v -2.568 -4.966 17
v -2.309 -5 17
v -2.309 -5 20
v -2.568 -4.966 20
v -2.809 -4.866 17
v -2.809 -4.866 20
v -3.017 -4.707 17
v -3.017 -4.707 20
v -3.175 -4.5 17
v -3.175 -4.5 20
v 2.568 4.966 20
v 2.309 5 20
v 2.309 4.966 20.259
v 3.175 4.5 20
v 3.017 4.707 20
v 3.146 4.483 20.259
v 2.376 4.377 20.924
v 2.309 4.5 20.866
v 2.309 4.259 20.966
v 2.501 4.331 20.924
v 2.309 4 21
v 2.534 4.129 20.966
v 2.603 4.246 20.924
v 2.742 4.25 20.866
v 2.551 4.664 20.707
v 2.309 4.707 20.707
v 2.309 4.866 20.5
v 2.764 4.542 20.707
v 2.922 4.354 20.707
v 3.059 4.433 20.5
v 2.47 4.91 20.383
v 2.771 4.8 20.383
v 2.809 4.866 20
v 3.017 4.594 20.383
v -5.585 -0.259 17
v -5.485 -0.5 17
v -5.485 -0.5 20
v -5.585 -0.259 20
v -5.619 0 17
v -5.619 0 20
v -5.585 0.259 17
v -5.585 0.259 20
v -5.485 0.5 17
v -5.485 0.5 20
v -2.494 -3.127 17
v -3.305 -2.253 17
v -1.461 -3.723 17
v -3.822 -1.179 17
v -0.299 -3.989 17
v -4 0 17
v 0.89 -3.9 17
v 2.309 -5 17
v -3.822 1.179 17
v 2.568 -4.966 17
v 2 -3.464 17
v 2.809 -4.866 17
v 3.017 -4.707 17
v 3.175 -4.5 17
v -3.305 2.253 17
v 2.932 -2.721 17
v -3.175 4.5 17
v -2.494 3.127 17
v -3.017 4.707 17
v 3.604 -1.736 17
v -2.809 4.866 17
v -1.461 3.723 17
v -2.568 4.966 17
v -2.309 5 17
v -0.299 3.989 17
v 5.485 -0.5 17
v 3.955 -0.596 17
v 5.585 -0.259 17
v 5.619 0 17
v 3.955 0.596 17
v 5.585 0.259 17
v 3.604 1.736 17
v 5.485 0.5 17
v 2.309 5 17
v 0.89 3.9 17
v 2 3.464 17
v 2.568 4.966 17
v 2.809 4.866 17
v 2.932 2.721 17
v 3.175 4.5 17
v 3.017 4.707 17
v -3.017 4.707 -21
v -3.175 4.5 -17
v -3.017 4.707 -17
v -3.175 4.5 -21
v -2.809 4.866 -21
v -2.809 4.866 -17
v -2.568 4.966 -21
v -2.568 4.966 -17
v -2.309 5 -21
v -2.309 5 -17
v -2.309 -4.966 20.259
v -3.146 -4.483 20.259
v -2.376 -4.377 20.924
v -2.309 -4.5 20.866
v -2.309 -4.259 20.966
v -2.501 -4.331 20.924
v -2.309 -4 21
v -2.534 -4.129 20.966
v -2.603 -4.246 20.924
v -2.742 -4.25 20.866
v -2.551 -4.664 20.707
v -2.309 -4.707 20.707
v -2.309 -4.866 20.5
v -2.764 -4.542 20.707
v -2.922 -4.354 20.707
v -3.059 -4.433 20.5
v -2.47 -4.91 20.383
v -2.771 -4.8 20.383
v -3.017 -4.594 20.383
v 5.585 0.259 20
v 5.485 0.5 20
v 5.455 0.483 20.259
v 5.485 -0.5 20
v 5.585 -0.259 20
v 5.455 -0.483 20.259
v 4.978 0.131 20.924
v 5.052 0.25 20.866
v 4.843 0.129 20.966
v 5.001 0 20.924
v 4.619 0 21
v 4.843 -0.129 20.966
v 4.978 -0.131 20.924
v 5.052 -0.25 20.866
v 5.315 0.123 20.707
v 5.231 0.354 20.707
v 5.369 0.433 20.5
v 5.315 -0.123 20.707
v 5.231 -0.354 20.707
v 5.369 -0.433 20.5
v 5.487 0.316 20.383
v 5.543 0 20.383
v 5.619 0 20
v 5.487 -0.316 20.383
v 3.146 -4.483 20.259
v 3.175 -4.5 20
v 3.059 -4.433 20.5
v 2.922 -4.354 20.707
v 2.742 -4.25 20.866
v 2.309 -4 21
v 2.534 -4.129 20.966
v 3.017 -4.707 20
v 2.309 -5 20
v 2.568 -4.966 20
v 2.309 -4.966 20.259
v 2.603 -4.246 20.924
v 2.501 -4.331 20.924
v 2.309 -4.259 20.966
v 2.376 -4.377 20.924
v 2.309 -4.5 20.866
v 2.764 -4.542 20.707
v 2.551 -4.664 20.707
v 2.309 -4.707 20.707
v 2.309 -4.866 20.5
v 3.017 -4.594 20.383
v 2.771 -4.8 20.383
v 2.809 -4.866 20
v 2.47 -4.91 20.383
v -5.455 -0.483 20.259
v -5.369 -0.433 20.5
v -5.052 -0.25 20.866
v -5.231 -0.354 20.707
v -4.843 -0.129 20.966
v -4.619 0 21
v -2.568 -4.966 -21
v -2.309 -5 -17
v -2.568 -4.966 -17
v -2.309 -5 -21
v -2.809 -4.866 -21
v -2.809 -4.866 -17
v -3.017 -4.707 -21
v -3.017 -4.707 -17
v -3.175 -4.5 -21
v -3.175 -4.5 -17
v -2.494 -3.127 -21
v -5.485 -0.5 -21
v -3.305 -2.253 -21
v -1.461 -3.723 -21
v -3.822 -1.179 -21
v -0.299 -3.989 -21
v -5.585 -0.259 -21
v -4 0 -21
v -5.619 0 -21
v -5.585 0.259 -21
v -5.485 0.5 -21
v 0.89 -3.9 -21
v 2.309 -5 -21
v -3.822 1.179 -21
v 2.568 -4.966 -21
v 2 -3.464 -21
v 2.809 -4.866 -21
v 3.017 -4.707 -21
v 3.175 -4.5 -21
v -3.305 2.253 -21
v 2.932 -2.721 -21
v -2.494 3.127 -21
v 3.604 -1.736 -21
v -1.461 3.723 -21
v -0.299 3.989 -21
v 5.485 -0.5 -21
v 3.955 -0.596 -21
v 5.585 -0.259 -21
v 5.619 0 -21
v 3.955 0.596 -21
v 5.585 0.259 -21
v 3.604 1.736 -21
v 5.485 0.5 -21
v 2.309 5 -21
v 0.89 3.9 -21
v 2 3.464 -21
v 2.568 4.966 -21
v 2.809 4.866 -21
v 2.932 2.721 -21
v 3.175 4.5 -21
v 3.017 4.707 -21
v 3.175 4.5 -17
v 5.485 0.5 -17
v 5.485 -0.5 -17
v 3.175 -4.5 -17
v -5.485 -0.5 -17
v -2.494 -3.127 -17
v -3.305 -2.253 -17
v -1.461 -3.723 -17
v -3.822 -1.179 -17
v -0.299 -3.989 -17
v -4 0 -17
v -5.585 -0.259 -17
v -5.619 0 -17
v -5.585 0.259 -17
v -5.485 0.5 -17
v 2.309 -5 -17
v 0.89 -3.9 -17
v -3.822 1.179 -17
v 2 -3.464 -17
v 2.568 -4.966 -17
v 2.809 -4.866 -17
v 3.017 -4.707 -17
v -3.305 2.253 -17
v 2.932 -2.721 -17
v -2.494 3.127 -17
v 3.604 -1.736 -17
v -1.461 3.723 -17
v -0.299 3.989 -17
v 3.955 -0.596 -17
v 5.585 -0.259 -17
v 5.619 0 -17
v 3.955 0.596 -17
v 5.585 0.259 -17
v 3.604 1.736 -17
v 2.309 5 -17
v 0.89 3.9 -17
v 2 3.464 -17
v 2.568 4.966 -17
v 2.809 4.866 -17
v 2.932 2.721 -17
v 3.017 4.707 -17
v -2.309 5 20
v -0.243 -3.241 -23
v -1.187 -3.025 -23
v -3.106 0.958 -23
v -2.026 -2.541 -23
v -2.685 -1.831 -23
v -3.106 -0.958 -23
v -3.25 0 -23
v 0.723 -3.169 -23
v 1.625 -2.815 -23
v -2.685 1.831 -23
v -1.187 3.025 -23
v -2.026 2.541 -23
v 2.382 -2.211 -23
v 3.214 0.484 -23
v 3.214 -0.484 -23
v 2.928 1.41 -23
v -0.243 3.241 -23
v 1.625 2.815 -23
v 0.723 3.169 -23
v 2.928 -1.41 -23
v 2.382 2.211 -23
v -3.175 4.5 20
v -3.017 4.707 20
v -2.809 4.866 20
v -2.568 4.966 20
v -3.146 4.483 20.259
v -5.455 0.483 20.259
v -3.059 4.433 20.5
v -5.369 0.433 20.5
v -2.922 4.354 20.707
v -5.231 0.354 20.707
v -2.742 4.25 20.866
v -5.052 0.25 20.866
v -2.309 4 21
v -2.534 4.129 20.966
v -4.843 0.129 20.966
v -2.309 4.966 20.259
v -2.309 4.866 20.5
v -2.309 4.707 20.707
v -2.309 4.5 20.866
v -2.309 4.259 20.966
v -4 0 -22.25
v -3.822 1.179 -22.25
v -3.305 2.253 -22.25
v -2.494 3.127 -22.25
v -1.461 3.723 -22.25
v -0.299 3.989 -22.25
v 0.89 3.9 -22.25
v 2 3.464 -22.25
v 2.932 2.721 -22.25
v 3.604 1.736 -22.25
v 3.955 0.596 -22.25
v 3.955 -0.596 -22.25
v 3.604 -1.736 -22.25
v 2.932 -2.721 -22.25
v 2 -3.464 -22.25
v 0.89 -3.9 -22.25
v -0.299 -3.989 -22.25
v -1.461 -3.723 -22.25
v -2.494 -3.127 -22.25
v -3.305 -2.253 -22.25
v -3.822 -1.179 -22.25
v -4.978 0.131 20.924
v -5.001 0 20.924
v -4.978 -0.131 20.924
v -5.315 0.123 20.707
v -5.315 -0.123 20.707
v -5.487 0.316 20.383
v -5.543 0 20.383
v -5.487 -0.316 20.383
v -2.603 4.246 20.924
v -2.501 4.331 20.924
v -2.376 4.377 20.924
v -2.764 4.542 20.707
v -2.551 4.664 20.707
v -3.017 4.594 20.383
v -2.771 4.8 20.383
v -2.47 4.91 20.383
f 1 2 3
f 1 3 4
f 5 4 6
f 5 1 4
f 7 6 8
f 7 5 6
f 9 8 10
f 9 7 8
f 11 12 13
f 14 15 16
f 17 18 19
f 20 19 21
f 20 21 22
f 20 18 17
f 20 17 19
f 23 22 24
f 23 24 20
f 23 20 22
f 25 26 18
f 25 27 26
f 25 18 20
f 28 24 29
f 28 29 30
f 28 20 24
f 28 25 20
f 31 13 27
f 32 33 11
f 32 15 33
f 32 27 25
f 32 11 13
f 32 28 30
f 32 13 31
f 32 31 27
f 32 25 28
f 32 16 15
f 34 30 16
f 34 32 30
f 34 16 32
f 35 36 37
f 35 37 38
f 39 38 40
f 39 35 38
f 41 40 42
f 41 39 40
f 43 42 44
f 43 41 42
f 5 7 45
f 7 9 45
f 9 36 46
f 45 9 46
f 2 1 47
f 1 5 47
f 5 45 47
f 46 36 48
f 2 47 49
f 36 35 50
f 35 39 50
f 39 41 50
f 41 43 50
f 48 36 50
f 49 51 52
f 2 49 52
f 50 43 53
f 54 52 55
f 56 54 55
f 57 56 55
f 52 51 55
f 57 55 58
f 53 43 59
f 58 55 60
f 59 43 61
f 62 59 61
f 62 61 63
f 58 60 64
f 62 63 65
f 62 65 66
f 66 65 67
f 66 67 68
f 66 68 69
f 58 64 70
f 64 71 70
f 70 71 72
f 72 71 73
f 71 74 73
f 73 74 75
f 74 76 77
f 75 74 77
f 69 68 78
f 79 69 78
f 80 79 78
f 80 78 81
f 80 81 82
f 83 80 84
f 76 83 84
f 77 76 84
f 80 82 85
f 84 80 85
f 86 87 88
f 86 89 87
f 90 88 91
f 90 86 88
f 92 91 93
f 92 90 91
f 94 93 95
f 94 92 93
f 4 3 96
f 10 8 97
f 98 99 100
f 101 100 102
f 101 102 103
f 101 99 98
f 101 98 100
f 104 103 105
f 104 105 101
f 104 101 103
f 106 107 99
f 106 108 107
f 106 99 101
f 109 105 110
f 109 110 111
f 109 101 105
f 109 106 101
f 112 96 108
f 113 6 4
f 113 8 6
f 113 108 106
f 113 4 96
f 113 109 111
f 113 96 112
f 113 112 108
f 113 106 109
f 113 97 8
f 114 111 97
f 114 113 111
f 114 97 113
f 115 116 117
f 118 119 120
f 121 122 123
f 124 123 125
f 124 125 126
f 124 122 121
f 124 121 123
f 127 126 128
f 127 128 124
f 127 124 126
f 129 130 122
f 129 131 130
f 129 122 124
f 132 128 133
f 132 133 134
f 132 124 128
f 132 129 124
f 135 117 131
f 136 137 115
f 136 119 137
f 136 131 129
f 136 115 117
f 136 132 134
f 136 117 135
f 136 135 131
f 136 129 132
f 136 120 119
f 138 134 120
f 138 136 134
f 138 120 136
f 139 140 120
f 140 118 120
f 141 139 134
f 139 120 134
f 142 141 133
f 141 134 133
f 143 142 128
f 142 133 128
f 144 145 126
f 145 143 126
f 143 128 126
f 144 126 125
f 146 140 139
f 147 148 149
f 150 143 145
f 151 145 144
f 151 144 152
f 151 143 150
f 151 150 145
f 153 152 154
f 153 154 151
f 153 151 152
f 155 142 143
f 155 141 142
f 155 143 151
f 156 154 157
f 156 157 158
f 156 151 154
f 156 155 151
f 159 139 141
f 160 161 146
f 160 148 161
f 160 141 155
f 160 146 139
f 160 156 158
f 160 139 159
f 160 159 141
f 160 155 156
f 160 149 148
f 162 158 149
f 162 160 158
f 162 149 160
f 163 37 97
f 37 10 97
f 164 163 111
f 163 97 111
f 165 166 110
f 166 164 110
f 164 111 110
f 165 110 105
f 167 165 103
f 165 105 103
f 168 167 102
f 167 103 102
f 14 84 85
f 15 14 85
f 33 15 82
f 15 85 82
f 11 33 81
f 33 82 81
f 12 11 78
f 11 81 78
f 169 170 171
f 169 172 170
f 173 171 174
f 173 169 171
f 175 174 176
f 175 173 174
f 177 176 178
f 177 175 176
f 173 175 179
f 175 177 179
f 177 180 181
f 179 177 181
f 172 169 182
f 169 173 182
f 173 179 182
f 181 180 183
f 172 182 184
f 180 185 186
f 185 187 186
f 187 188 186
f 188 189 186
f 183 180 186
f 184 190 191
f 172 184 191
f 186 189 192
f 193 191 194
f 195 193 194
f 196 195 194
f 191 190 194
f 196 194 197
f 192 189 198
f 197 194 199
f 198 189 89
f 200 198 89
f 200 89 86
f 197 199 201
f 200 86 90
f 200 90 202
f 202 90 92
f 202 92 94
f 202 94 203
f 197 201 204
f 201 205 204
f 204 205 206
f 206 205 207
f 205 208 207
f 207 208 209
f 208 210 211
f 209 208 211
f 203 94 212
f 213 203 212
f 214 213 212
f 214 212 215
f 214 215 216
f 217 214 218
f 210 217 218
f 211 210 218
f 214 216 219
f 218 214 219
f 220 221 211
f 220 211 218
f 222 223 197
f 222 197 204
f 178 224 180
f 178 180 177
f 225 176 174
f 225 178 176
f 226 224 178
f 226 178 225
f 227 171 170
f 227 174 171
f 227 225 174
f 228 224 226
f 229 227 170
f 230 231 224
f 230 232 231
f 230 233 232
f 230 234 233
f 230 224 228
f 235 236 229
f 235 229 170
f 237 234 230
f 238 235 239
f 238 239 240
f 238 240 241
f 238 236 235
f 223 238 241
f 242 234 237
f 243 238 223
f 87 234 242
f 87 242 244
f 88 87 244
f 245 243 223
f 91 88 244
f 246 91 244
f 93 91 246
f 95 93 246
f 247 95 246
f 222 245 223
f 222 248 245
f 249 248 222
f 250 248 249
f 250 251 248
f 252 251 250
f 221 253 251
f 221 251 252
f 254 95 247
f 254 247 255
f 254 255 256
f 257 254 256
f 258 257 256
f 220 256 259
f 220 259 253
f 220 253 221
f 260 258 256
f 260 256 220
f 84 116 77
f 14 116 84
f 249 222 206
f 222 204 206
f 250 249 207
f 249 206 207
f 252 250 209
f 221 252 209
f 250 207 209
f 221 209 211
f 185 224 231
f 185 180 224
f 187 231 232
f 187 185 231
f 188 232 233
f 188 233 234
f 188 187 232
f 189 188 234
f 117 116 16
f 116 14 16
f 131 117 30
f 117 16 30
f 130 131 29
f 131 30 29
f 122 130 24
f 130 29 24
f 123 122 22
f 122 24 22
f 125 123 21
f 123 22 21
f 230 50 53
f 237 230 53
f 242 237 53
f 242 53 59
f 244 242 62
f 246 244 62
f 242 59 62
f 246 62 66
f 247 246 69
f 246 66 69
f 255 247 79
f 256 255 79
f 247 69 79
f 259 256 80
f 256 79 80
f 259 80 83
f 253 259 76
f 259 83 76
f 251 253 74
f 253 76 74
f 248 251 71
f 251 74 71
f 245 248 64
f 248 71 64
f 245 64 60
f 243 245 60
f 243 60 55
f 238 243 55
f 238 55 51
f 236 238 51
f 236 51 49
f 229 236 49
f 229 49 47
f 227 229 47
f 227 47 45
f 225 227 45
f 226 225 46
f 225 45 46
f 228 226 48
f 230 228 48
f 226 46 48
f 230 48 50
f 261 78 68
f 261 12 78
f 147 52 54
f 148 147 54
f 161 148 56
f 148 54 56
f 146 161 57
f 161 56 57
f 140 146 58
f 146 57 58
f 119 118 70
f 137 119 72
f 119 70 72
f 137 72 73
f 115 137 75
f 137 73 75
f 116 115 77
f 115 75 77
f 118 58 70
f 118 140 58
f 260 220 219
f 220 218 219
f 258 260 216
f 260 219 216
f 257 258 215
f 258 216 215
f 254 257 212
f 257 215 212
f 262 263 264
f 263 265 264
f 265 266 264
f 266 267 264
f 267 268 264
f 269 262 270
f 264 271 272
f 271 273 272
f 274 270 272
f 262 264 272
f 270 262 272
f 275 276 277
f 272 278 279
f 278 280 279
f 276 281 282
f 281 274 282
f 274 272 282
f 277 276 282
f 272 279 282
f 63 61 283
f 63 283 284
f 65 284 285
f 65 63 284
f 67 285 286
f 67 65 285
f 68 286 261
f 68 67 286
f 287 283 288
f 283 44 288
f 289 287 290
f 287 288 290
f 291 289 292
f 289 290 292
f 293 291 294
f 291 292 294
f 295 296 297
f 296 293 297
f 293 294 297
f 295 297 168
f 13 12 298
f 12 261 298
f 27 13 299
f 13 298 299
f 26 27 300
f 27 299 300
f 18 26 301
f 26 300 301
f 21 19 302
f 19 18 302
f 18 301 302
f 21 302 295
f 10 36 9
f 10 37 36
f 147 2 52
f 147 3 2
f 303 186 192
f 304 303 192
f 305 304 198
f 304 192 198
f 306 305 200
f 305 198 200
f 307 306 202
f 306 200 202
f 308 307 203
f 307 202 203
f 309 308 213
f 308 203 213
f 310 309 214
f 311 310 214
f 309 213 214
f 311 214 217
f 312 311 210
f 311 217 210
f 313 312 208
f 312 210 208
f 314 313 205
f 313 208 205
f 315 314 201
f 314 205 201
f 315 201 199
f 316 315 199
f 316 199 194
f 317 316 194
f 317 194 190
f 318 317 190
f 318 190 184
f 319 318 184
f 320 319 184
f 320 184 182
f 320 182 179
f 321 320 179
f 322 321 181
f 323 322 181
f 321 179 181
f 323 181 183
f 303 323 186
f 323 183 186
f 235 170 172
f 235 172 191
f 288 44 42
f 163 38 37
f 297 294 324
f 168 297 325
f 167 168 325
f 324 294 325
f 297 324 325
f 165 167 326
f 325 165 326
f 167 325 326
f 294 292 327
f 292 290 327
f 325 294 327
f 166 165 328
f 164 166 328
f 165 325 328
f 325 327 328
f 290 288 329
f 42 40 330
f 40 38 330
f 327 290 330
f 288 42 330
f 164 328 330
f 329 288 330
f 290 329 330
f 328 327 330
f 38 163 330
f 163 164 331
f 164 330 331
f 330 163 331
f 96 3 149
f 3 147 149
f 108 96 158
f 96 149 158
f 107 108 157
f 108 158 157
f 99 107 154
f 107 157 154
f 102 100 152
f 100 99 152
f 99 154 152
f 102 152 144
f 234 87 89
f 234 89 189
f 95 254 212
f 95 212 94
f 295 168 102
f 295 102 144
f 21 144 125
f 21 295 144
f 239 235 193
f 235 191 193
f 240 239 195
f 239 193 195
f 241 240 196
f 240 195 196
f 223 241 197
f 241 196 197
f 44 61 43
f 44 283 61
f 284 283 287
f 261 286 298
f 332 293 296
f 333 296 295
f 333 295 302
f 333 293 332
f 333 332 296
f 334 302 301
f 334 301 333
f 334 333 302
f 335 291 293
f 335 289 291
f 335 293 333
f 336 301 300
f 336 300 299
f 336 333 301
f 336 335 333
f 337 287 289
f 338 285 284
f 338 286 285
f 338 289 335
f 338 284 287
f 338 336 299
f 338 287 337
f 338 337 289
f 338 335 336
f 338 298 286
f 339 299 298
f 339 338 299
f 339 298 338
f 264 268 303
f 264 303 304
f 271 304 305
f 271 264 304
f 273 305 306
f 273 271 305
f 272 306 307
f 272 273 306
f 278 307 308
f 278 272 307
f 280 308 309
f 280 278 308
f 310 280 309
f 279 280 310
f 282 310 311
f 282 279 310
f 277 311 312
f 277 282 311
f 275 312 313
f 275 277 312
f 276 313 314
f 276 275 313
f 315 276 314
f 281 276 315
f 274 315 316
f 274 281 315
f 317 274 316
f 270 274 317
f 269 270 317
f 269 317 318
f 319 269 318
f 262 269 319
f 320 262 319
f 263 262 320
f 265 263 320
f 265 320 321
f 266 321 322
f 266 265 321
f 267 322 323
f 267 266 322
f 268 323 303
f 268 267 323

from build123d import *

# Parameters (mm, degrees)
EXTRUDE_1_DEPTH = 4
SKETCH_2_R      = 4
EXTRUDE_2_DEPTH = 34
EXTRUDE_3_DEPTH = 4
SKETCH_4_W      = 4
SKETCH_4_H      = 2
CHAMFER_1_SIZE  = 0.75
FILLET_1_R      = 1


with BuildPart() as part:
    # 草图1 → 凸台-拉伸1 (new body)
    with BuildSketch(Plane.XY.offset(21)):
        Polygon((-2.886751346, -5), (2.886751346, -5), (5.773502692, 0), (2.886751346, 5), (-2.886751346, 5), (-5.773502692, 0), align=None)
    extrude(amount=-EXTRUDE_1_DEPTH)

    # 草图2 → 凸台-拉伸2 (add)
    with BuildSketch(Plane(origin=(0, 0, 17), x_dir=(-1, 0, 0), z_dir=(0, 0, -1))):
        Circle(SKETCH_2_R)
    extrude(amount=EXTRUDE_2_DEPTH)

    # 草图3 → 凸台-拉伸3 (add)
    with BuildSketch(Plane.XY.offset(-17)):
        Polygon((-2.886751346, -5), (2.886751346, -5), (5.773502692, 0), (2.886751346, 5), (-2.886751346, 5), (-5.773502692, 0), align=None)
    extrude(amount=-EXTRUDE_3_DEPTH)

    # 草图4 → 旋转1 (revolve)
    with BuildSketch(Plane.XZ, mode=Mode.PRIVATE) as revolve_1_sk:
        with Locations((2, -22)):
            Rectangle(SKETCH_4_W, SKETCH_4_H)
    revolve(revolve_1_sk.sketch.rotate(Axis((0, 0, -21), (0, 0, -1)), 180), axis=Axis((0, 0, -21), (0, 0, -1)))

    # 倒角1
    chamfer_1_edges = [part.edges().sort_by_distance(p)[0] for p in [
        (4, 0, -23),
    ]]
    chamfer(chamfer_1_edges, length=CHAMFER_1_SIZE)

    # 圆角1
    fillet_1_edges = [part.edges().sort_by_distance(p)[0] for p in [
        (-5.773502692, 0, 19),
        (-2.886751346, 5, 19),
        (2.886751346, 5, 19),
        (5.773502692, 0, 19),
        (2.886751346, -5, 19),
        (-2.886751346, -5, 19),
        (-2.886751346, -5, -19),
        (-5.773502692, 0, -19),
        (-2.886751346, 5, -19),
        (2.886751346, 5, -19),
        (5.773502692, 0, -19),
        (2.886751346, -5, -19),
        (-4.330127019, 2.5, 21),
        (0, 5, 21),
        (4.330127019, 2.5, 21),
        (4.330127019, -2.5, 21),
        (0, -5, 21),
        (-4.330127019, -2.5, 21),
    ]]
    fillet(fillet_1_edges, radius=FILLET_1_R)


solid = part.part
